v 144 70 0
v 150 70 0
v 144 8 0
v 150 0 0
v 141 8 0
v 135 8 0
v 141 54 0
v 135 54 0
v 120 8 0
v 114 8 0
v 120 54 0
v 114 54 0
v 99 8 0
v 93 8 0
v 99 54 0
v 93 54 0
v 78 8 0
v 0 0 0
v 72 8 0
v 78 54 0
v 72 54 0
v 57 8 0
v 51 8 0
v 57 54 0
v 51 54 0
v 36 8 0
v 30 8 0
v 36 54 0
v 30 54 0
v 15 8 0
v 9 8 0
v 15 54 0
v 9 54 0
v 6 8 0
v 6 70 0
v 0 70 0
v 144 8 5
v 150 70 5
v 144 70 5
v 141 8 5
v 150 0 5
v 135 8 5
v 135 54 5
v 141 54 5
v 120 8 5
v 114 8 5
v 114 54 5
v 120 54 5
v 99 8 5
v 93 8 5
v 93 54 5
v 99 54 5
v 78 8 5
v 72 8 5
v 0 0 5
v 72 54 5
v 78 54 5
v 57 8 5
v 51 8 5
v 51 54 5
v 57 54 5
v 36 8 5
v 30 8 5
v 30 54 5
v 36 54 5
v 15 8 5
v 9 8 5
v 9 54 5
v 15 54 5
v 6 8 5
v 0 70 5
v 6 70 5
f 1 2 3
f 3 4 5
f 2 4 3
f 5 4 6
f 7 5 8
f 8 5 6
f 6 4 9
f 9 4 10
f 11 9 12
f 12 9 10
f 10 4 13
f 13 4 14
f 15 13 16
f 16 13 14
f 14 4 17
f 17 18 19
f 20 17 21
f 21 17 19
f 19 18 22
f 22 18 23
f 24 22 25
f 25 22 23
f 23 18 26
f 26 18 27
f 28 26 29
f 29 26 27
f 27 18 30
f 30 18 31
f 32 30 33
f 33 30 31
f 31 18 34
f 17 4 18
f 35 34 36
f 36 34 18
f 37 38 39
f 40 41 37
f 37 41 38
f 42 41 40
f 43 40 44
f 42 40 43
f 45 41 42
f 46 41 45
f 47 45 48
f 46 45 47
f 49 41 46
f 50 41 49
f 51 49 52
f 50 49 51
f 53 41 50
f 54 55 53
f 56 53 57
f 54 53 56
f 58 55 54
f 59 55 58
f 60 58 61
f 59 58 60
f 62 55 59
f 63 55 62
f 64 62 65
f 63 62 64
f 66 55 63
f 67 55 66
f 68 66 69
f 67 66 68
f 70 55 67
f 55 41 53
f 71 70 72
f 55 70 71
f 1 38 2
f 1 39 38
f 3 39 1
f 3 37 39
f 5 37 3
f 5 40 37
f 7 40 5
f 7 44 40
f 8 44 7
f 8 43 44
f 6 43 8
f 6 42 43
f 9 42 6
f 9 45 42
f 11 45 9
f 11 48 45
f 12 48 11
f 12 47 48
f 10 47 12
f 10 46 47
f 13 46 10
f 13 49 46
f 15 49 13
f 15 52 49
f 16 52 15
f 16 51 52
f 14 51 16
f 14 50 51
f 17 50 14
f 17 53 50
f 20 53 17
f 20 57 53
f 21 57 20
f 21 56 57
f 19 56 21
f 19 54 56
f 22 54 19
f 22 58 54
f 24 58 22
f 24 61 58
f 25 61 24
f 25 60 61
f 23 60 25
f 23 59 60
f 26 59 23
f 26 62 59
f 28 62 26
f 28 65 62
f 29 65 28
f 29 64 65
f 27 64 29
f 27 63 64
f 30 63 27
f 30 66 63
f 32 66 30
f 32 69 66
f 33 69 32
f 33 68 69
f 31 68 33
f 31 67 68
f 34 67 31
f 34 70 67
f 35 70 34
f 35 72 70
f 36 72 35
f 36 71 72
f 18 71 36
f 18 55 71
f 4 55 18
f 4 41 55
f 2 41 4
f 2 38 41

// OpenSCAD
$fn = 32;

// ----------------------------------------------------------------------
// Guard grille: 7 slats over a 150 x 70 mm plate
// ----------------------------------------------------------------------

// --- parameters (mm) ---
profile_height = 5;       // extrusion height
profile_points = 36;      // points of the closed outline

profile = [[0, 0], [150, 0], [150, 70], [144, 70], [144, 8], [141, 8], [141, 54], [135, 54], [135, 8], [120, 8], [120, 54], [114, 54], [114, 8], [99, 8], [99, 54], [93, 54], [93, 8], [78, 8], [78, 54], [72, 54], [72, 8], [57, 8], [57, 54], [51, 54], [51, 8], [36, 8], [36, 54], [30, 54], [30, 8], [15, 8], [15, 54], [9, 54], [9, 8], [6, 8], [6, 70], [0, 70]];  // single closed polygon, 36 points, counter clockwise

// --- the one profile operation ---
linear_extrude(height = profile_height) polygon(points = profile);
